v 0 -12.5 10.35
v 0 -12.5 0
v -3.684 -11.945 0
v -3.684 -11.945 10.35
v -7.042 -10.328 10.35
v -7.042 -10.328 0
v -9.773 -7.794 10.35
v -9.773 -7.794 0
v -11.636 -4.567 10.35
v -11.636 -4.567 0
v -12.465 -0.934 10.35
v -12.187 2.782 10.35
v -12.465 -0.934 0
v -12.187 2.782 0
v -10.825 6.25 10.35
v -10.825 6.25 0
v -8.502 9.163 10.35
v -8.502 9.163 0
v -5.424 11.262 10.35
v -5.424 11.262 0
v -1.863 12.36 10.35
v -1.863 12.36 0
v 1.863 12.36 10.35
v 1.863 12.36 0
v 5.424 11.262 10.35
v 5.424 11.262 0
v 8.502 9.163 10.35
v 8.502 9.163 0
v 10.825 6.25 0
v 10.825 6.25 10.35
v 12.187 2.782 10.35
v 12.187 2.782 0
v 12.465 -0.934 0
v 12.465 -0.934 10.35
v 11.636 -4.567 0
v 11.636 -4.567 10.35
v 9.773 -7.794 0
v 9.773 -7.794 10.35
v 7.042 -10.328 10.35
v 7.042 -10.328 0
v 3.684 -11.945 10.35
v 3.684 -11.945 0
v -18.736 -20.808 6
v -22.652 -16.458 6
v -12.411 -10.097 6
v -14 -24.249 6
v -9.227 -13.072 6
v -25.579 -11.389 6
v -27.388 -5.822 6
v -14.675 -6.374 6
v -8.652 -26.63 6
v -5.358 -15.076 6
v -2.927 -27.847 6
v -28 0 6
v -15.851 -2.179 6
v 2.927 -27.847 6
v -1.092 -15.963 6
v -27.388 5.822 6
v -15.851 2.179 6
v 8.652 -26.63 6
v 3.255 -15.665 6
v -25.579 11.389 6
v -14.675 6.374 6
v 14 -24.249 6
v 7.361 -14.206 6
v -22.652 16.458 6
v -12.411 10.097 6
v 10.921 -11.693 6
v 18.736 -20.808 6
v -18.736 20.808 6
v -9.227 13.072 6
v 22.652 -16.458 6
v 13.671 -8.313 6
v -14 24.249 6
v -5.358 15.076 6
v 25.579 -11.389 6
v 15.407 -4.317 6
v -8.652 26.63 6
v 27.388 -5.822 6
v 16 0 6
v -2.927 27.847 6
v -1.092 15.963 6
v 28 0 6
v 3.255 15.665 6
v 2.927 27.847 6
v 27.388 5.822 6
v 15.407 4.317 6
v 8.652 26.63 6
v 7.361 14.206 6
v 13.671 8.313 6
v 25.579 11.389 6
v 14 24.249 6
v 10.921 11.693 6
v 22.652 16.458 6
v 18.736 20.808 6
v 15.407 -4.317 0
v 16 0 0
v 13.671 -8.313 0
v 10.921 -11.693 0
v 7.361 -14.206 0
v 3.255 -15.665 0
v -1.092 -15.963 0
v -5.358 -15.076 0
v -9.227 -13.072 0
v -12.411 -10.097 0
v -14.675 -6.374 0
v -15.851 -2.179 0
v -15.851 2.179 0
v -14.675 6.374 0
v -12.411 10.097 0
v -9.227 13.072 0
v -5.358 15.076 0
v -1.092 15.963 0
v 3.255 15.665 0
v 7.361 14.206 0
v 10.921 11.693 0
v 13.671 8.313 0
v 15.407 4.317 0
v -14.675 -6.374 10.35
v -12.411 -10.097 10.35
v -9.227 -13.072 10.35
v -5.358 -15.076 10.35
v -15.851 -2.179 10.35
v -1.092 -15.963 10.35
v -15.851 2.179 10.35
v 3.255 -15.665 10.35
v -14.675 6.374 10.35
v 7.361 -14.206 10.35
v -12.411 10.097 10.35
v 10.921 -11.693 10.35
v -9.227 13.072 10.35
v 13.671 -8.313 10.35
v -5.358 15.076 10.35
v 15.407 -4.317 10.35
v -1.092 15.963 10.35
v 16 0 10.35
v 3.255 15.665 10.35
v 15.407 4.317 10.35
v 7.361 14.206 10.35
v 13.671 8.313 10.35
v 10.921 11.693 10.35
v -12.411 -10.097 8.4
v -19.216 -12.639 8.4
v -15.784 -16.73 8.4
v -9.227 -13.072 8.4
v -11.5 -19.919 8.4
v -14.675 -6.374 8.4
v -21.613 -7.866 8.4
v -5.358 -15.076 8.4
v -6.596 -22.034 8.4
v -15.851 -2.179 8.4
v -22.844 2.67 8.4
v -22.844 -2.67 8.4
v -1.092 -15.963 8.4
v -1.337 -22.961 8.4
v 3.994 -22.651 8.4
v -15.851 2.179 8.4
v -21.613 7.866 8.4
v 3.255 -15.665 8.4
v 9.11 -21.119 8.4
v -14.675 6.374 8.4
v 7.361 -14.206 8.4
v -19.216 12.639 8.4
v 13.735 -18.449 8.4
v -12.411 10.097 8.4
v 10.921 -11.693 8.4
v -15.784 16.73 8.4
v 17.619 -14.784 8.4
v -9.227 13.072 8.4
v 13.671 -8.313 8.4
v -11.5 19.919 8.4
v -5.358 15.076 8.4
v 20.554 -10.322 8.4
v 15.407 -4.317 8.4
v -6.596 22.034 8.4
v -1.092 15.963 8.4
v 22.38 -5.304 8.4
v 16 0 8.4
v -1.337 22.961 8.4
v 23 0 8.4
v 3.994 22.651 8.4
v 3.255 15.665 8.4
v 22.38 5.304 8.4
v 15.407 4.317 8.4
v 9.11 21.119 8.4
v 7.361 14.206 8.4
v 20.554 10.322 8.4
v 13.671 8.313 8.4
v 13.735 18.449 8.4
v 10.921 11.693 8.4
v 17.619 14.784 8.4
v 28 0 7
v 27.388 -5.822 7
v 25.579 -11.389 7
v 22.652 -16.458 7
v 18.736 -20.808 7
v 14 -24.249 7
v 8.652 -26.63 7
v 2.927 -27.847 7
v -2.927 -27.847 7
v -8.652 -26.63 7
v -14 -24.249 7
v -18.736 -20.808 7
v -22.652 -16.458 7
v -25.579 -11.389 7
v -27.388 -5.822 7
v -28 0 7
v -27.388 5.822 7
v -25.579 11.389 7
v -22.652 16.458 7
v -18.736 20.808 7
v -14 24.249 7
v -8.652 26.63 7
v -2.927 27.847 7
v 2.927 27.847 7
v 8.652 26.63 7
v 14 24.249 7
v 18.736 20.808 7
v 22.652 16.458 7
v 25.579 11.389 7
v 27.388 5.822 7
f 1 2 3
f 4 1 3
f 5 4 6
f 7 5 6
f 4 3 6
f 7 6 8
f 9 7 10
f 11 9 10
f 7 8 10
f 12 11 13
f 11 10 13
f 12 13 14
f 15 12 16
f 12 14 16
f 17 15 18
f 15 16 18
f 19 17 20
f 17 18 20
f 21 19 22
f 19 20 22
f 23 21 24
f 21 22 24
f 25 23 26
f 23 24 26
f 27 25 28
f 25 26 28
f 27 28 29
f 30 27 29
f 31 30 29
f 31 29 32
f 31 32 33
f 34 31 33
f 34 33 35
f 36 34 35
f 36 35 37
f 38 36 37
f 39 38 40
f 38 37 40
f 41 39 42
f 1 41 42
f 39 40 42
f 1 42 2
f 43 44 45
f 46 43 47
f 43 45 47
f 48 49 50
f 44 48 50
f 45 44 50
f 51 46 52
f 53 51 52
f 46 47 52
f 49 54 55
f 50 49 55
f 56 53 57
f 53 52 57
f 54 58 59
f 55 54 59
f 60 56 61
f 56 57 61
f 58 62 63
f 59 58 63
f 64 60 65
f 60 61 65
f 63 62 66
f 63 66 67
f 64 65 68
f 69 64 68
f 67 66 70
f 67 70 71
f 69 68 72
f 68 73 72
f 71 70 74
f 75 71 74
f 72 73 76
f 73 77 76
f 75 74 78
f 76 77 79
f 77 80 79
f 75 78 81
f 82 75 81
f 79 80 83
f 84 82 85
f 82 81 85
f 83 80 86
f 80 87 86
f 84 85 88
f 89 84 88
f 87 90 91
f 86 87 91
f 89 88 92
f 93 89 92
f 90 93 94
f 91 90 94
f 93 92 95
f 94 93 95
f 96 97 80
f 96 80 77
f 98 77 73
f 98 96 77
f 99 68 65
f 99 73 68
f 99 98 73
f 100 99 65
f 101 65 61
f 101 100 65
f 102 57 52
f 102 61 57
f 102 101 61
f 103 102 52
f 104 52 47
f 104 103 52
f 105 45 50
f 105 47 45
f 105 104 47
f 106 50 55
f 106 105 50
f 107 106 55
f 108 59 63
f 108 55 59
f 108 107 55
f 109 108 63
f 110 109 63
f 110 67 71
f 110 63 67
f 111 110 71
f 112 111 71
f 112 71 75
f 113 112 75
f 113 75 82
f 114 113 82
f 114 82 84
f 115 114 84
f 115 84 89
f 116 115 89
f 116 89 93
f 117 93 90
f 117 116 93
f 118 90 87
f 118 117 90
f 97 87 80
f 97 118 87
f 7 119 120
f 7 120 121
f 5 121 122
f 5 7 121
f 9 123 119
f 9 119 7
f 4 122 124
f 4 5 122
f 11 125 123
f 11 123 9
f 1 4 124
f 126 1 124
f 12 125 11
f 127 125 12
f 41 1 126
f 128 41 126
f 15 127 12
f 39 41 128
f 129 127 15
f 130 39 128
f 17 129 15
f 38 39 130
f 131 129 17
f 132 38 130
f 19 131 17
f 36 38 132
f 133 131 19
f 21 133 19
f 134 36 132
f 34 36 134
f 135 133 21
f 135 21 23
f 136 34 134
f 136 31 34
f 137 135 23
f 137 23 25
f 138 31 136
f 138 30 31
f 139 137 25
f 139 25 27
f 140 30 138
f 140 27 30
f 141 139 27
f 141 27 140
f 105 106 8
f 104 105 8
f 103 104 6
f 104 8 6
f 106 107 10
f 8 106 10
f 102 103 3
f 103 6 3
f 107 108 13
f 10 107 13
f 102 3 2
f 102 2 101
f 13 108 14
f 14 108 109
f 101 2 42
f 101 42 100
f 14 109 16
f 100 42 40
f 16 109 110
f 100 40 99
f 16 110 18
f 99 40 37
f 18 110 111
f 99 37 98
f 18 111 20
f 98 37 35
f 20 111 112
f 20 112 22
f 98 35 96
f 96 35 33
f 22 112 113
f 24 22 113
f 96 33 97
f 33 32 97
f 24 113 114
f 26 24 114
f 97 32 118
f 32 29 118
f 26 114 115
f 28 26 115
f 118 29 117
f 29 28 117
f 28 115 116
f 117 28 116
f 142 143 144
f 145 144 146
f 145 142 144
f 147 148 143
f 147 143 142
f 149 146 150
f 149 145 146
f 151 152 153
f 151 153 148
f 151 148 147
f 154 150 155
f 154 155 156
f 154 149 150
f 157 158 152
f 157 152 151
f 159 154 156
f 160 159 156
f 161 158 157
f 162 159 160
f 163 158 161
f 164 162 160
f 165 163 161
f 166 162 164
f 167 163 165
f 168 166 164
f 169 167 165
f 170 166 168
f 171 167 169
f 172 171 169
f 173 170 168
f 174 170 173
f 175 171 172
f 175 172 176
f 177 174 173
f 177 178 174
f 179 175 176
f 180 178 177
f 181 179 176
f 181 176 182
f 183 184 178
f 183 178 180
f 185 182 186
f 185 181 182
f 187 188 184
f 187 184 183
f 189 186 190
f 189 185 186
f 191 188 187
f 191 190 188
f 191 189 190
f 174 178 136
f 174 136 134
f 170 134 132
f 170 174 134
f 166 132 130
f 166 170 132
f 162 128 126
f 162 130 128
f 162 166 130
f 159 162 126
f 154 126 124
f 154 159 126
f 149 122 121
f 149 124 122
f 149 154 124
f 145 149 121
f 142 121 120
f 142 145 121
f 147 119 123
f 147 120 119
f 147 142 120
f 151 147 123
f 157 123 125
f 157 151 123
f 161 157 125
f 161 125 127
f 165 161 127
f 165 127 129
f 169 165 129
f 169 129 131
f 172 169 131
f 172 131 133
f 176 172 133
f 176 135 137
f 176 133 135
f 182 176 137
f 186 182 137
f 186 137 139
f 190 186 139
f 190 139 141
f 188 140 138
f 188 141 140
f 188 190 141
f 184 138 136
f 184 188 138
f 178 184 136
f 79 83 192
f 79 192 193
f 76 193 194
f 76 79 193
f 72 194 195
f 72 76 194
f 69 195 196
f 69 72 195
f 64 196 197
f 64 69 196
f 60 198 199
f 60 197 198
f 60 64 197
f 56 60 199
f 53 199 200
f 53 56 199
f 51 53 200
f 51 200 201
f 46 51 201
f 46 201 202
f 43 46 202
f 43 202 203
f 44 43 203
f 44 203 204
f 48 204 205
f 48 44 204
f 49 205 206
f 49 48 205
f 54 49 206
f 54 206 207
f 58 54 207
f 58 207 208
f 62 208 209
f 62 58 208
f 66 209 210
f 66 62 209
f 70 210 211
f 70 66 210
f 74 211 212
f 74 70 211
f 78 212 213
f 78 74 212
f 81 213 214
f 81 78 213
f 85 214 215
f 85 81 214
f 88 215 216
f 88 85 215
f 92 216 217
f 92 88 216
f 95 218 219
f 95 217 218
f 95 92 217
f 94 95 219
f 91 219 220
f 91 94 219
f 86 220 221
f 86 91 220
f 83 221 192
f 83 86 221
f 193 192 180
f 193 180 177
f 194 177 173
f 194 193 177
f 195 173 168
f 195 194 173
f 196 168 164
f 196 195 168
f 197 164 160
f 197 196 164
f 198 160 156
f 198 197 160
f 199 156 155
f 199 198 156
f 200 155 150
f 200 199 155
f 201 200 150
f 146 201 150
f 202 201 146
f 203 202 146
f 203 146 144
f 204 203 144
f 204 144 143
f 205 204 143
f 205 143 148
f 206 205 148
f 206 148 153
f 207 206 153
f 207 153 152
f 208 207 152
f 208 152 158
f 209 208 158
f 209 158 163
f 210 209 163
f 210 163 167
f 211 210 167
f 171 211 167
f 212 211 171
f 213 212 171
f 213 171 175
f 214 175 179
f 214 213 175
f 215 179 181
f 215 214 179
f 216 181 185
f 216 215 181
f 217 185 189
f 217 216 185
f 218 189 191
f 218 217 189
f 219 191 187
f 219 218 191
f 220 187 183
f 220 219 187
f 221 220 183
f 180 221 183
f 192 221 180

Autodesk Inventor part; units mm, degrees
ref_plane "YZ Plane" through (0, 0, 0) normal (1, 0, 0) x (0, 1, 0)
ref_plane "XZ Plane" through (0, 0, 0) normal (0, 1, 0) x (-1, 0, 0)
ref_plane "XY Plane" through (0, 0, 0) normal (0, 0, 1) x (1, 0, 0)
sketch "草圖1" plane through (0, 0, 0) normal (0, 0, 1) x (1, 0, 0)
  circle A0 centre (0, 0) radius 16
extrude "擠出1" add sketch "草圖1" along normal blind 6
sketch "草圖2" plane through (0, 0, 6) normal (0, 0, 1) x (1, 0, 0)
  circle A0 centre (0, 0) radius 28
extrude "擠出2" add sketch "草圖2" along normal blind 2.4
sketch "草圖3" plane through (0, 0, 8.4) normal (0, 0, 1) x (1, 0, 0)
  circle A0 centre (0, 0) radius 16
extrude "擠出3" add sketch "草圖3" along normal blind 1.95
hole "孔1" at (0, 0, 10.35) direction (0, 0, -1) diameter 25 end through all
chamfer "倒角1" distance 1.4 distance2 5 1 edges at (-28, 0, 8.4) measured on face at (27.9092, -2.2531, 7.6)
properties part number "KL-SL-023-KMB-601-PT"
